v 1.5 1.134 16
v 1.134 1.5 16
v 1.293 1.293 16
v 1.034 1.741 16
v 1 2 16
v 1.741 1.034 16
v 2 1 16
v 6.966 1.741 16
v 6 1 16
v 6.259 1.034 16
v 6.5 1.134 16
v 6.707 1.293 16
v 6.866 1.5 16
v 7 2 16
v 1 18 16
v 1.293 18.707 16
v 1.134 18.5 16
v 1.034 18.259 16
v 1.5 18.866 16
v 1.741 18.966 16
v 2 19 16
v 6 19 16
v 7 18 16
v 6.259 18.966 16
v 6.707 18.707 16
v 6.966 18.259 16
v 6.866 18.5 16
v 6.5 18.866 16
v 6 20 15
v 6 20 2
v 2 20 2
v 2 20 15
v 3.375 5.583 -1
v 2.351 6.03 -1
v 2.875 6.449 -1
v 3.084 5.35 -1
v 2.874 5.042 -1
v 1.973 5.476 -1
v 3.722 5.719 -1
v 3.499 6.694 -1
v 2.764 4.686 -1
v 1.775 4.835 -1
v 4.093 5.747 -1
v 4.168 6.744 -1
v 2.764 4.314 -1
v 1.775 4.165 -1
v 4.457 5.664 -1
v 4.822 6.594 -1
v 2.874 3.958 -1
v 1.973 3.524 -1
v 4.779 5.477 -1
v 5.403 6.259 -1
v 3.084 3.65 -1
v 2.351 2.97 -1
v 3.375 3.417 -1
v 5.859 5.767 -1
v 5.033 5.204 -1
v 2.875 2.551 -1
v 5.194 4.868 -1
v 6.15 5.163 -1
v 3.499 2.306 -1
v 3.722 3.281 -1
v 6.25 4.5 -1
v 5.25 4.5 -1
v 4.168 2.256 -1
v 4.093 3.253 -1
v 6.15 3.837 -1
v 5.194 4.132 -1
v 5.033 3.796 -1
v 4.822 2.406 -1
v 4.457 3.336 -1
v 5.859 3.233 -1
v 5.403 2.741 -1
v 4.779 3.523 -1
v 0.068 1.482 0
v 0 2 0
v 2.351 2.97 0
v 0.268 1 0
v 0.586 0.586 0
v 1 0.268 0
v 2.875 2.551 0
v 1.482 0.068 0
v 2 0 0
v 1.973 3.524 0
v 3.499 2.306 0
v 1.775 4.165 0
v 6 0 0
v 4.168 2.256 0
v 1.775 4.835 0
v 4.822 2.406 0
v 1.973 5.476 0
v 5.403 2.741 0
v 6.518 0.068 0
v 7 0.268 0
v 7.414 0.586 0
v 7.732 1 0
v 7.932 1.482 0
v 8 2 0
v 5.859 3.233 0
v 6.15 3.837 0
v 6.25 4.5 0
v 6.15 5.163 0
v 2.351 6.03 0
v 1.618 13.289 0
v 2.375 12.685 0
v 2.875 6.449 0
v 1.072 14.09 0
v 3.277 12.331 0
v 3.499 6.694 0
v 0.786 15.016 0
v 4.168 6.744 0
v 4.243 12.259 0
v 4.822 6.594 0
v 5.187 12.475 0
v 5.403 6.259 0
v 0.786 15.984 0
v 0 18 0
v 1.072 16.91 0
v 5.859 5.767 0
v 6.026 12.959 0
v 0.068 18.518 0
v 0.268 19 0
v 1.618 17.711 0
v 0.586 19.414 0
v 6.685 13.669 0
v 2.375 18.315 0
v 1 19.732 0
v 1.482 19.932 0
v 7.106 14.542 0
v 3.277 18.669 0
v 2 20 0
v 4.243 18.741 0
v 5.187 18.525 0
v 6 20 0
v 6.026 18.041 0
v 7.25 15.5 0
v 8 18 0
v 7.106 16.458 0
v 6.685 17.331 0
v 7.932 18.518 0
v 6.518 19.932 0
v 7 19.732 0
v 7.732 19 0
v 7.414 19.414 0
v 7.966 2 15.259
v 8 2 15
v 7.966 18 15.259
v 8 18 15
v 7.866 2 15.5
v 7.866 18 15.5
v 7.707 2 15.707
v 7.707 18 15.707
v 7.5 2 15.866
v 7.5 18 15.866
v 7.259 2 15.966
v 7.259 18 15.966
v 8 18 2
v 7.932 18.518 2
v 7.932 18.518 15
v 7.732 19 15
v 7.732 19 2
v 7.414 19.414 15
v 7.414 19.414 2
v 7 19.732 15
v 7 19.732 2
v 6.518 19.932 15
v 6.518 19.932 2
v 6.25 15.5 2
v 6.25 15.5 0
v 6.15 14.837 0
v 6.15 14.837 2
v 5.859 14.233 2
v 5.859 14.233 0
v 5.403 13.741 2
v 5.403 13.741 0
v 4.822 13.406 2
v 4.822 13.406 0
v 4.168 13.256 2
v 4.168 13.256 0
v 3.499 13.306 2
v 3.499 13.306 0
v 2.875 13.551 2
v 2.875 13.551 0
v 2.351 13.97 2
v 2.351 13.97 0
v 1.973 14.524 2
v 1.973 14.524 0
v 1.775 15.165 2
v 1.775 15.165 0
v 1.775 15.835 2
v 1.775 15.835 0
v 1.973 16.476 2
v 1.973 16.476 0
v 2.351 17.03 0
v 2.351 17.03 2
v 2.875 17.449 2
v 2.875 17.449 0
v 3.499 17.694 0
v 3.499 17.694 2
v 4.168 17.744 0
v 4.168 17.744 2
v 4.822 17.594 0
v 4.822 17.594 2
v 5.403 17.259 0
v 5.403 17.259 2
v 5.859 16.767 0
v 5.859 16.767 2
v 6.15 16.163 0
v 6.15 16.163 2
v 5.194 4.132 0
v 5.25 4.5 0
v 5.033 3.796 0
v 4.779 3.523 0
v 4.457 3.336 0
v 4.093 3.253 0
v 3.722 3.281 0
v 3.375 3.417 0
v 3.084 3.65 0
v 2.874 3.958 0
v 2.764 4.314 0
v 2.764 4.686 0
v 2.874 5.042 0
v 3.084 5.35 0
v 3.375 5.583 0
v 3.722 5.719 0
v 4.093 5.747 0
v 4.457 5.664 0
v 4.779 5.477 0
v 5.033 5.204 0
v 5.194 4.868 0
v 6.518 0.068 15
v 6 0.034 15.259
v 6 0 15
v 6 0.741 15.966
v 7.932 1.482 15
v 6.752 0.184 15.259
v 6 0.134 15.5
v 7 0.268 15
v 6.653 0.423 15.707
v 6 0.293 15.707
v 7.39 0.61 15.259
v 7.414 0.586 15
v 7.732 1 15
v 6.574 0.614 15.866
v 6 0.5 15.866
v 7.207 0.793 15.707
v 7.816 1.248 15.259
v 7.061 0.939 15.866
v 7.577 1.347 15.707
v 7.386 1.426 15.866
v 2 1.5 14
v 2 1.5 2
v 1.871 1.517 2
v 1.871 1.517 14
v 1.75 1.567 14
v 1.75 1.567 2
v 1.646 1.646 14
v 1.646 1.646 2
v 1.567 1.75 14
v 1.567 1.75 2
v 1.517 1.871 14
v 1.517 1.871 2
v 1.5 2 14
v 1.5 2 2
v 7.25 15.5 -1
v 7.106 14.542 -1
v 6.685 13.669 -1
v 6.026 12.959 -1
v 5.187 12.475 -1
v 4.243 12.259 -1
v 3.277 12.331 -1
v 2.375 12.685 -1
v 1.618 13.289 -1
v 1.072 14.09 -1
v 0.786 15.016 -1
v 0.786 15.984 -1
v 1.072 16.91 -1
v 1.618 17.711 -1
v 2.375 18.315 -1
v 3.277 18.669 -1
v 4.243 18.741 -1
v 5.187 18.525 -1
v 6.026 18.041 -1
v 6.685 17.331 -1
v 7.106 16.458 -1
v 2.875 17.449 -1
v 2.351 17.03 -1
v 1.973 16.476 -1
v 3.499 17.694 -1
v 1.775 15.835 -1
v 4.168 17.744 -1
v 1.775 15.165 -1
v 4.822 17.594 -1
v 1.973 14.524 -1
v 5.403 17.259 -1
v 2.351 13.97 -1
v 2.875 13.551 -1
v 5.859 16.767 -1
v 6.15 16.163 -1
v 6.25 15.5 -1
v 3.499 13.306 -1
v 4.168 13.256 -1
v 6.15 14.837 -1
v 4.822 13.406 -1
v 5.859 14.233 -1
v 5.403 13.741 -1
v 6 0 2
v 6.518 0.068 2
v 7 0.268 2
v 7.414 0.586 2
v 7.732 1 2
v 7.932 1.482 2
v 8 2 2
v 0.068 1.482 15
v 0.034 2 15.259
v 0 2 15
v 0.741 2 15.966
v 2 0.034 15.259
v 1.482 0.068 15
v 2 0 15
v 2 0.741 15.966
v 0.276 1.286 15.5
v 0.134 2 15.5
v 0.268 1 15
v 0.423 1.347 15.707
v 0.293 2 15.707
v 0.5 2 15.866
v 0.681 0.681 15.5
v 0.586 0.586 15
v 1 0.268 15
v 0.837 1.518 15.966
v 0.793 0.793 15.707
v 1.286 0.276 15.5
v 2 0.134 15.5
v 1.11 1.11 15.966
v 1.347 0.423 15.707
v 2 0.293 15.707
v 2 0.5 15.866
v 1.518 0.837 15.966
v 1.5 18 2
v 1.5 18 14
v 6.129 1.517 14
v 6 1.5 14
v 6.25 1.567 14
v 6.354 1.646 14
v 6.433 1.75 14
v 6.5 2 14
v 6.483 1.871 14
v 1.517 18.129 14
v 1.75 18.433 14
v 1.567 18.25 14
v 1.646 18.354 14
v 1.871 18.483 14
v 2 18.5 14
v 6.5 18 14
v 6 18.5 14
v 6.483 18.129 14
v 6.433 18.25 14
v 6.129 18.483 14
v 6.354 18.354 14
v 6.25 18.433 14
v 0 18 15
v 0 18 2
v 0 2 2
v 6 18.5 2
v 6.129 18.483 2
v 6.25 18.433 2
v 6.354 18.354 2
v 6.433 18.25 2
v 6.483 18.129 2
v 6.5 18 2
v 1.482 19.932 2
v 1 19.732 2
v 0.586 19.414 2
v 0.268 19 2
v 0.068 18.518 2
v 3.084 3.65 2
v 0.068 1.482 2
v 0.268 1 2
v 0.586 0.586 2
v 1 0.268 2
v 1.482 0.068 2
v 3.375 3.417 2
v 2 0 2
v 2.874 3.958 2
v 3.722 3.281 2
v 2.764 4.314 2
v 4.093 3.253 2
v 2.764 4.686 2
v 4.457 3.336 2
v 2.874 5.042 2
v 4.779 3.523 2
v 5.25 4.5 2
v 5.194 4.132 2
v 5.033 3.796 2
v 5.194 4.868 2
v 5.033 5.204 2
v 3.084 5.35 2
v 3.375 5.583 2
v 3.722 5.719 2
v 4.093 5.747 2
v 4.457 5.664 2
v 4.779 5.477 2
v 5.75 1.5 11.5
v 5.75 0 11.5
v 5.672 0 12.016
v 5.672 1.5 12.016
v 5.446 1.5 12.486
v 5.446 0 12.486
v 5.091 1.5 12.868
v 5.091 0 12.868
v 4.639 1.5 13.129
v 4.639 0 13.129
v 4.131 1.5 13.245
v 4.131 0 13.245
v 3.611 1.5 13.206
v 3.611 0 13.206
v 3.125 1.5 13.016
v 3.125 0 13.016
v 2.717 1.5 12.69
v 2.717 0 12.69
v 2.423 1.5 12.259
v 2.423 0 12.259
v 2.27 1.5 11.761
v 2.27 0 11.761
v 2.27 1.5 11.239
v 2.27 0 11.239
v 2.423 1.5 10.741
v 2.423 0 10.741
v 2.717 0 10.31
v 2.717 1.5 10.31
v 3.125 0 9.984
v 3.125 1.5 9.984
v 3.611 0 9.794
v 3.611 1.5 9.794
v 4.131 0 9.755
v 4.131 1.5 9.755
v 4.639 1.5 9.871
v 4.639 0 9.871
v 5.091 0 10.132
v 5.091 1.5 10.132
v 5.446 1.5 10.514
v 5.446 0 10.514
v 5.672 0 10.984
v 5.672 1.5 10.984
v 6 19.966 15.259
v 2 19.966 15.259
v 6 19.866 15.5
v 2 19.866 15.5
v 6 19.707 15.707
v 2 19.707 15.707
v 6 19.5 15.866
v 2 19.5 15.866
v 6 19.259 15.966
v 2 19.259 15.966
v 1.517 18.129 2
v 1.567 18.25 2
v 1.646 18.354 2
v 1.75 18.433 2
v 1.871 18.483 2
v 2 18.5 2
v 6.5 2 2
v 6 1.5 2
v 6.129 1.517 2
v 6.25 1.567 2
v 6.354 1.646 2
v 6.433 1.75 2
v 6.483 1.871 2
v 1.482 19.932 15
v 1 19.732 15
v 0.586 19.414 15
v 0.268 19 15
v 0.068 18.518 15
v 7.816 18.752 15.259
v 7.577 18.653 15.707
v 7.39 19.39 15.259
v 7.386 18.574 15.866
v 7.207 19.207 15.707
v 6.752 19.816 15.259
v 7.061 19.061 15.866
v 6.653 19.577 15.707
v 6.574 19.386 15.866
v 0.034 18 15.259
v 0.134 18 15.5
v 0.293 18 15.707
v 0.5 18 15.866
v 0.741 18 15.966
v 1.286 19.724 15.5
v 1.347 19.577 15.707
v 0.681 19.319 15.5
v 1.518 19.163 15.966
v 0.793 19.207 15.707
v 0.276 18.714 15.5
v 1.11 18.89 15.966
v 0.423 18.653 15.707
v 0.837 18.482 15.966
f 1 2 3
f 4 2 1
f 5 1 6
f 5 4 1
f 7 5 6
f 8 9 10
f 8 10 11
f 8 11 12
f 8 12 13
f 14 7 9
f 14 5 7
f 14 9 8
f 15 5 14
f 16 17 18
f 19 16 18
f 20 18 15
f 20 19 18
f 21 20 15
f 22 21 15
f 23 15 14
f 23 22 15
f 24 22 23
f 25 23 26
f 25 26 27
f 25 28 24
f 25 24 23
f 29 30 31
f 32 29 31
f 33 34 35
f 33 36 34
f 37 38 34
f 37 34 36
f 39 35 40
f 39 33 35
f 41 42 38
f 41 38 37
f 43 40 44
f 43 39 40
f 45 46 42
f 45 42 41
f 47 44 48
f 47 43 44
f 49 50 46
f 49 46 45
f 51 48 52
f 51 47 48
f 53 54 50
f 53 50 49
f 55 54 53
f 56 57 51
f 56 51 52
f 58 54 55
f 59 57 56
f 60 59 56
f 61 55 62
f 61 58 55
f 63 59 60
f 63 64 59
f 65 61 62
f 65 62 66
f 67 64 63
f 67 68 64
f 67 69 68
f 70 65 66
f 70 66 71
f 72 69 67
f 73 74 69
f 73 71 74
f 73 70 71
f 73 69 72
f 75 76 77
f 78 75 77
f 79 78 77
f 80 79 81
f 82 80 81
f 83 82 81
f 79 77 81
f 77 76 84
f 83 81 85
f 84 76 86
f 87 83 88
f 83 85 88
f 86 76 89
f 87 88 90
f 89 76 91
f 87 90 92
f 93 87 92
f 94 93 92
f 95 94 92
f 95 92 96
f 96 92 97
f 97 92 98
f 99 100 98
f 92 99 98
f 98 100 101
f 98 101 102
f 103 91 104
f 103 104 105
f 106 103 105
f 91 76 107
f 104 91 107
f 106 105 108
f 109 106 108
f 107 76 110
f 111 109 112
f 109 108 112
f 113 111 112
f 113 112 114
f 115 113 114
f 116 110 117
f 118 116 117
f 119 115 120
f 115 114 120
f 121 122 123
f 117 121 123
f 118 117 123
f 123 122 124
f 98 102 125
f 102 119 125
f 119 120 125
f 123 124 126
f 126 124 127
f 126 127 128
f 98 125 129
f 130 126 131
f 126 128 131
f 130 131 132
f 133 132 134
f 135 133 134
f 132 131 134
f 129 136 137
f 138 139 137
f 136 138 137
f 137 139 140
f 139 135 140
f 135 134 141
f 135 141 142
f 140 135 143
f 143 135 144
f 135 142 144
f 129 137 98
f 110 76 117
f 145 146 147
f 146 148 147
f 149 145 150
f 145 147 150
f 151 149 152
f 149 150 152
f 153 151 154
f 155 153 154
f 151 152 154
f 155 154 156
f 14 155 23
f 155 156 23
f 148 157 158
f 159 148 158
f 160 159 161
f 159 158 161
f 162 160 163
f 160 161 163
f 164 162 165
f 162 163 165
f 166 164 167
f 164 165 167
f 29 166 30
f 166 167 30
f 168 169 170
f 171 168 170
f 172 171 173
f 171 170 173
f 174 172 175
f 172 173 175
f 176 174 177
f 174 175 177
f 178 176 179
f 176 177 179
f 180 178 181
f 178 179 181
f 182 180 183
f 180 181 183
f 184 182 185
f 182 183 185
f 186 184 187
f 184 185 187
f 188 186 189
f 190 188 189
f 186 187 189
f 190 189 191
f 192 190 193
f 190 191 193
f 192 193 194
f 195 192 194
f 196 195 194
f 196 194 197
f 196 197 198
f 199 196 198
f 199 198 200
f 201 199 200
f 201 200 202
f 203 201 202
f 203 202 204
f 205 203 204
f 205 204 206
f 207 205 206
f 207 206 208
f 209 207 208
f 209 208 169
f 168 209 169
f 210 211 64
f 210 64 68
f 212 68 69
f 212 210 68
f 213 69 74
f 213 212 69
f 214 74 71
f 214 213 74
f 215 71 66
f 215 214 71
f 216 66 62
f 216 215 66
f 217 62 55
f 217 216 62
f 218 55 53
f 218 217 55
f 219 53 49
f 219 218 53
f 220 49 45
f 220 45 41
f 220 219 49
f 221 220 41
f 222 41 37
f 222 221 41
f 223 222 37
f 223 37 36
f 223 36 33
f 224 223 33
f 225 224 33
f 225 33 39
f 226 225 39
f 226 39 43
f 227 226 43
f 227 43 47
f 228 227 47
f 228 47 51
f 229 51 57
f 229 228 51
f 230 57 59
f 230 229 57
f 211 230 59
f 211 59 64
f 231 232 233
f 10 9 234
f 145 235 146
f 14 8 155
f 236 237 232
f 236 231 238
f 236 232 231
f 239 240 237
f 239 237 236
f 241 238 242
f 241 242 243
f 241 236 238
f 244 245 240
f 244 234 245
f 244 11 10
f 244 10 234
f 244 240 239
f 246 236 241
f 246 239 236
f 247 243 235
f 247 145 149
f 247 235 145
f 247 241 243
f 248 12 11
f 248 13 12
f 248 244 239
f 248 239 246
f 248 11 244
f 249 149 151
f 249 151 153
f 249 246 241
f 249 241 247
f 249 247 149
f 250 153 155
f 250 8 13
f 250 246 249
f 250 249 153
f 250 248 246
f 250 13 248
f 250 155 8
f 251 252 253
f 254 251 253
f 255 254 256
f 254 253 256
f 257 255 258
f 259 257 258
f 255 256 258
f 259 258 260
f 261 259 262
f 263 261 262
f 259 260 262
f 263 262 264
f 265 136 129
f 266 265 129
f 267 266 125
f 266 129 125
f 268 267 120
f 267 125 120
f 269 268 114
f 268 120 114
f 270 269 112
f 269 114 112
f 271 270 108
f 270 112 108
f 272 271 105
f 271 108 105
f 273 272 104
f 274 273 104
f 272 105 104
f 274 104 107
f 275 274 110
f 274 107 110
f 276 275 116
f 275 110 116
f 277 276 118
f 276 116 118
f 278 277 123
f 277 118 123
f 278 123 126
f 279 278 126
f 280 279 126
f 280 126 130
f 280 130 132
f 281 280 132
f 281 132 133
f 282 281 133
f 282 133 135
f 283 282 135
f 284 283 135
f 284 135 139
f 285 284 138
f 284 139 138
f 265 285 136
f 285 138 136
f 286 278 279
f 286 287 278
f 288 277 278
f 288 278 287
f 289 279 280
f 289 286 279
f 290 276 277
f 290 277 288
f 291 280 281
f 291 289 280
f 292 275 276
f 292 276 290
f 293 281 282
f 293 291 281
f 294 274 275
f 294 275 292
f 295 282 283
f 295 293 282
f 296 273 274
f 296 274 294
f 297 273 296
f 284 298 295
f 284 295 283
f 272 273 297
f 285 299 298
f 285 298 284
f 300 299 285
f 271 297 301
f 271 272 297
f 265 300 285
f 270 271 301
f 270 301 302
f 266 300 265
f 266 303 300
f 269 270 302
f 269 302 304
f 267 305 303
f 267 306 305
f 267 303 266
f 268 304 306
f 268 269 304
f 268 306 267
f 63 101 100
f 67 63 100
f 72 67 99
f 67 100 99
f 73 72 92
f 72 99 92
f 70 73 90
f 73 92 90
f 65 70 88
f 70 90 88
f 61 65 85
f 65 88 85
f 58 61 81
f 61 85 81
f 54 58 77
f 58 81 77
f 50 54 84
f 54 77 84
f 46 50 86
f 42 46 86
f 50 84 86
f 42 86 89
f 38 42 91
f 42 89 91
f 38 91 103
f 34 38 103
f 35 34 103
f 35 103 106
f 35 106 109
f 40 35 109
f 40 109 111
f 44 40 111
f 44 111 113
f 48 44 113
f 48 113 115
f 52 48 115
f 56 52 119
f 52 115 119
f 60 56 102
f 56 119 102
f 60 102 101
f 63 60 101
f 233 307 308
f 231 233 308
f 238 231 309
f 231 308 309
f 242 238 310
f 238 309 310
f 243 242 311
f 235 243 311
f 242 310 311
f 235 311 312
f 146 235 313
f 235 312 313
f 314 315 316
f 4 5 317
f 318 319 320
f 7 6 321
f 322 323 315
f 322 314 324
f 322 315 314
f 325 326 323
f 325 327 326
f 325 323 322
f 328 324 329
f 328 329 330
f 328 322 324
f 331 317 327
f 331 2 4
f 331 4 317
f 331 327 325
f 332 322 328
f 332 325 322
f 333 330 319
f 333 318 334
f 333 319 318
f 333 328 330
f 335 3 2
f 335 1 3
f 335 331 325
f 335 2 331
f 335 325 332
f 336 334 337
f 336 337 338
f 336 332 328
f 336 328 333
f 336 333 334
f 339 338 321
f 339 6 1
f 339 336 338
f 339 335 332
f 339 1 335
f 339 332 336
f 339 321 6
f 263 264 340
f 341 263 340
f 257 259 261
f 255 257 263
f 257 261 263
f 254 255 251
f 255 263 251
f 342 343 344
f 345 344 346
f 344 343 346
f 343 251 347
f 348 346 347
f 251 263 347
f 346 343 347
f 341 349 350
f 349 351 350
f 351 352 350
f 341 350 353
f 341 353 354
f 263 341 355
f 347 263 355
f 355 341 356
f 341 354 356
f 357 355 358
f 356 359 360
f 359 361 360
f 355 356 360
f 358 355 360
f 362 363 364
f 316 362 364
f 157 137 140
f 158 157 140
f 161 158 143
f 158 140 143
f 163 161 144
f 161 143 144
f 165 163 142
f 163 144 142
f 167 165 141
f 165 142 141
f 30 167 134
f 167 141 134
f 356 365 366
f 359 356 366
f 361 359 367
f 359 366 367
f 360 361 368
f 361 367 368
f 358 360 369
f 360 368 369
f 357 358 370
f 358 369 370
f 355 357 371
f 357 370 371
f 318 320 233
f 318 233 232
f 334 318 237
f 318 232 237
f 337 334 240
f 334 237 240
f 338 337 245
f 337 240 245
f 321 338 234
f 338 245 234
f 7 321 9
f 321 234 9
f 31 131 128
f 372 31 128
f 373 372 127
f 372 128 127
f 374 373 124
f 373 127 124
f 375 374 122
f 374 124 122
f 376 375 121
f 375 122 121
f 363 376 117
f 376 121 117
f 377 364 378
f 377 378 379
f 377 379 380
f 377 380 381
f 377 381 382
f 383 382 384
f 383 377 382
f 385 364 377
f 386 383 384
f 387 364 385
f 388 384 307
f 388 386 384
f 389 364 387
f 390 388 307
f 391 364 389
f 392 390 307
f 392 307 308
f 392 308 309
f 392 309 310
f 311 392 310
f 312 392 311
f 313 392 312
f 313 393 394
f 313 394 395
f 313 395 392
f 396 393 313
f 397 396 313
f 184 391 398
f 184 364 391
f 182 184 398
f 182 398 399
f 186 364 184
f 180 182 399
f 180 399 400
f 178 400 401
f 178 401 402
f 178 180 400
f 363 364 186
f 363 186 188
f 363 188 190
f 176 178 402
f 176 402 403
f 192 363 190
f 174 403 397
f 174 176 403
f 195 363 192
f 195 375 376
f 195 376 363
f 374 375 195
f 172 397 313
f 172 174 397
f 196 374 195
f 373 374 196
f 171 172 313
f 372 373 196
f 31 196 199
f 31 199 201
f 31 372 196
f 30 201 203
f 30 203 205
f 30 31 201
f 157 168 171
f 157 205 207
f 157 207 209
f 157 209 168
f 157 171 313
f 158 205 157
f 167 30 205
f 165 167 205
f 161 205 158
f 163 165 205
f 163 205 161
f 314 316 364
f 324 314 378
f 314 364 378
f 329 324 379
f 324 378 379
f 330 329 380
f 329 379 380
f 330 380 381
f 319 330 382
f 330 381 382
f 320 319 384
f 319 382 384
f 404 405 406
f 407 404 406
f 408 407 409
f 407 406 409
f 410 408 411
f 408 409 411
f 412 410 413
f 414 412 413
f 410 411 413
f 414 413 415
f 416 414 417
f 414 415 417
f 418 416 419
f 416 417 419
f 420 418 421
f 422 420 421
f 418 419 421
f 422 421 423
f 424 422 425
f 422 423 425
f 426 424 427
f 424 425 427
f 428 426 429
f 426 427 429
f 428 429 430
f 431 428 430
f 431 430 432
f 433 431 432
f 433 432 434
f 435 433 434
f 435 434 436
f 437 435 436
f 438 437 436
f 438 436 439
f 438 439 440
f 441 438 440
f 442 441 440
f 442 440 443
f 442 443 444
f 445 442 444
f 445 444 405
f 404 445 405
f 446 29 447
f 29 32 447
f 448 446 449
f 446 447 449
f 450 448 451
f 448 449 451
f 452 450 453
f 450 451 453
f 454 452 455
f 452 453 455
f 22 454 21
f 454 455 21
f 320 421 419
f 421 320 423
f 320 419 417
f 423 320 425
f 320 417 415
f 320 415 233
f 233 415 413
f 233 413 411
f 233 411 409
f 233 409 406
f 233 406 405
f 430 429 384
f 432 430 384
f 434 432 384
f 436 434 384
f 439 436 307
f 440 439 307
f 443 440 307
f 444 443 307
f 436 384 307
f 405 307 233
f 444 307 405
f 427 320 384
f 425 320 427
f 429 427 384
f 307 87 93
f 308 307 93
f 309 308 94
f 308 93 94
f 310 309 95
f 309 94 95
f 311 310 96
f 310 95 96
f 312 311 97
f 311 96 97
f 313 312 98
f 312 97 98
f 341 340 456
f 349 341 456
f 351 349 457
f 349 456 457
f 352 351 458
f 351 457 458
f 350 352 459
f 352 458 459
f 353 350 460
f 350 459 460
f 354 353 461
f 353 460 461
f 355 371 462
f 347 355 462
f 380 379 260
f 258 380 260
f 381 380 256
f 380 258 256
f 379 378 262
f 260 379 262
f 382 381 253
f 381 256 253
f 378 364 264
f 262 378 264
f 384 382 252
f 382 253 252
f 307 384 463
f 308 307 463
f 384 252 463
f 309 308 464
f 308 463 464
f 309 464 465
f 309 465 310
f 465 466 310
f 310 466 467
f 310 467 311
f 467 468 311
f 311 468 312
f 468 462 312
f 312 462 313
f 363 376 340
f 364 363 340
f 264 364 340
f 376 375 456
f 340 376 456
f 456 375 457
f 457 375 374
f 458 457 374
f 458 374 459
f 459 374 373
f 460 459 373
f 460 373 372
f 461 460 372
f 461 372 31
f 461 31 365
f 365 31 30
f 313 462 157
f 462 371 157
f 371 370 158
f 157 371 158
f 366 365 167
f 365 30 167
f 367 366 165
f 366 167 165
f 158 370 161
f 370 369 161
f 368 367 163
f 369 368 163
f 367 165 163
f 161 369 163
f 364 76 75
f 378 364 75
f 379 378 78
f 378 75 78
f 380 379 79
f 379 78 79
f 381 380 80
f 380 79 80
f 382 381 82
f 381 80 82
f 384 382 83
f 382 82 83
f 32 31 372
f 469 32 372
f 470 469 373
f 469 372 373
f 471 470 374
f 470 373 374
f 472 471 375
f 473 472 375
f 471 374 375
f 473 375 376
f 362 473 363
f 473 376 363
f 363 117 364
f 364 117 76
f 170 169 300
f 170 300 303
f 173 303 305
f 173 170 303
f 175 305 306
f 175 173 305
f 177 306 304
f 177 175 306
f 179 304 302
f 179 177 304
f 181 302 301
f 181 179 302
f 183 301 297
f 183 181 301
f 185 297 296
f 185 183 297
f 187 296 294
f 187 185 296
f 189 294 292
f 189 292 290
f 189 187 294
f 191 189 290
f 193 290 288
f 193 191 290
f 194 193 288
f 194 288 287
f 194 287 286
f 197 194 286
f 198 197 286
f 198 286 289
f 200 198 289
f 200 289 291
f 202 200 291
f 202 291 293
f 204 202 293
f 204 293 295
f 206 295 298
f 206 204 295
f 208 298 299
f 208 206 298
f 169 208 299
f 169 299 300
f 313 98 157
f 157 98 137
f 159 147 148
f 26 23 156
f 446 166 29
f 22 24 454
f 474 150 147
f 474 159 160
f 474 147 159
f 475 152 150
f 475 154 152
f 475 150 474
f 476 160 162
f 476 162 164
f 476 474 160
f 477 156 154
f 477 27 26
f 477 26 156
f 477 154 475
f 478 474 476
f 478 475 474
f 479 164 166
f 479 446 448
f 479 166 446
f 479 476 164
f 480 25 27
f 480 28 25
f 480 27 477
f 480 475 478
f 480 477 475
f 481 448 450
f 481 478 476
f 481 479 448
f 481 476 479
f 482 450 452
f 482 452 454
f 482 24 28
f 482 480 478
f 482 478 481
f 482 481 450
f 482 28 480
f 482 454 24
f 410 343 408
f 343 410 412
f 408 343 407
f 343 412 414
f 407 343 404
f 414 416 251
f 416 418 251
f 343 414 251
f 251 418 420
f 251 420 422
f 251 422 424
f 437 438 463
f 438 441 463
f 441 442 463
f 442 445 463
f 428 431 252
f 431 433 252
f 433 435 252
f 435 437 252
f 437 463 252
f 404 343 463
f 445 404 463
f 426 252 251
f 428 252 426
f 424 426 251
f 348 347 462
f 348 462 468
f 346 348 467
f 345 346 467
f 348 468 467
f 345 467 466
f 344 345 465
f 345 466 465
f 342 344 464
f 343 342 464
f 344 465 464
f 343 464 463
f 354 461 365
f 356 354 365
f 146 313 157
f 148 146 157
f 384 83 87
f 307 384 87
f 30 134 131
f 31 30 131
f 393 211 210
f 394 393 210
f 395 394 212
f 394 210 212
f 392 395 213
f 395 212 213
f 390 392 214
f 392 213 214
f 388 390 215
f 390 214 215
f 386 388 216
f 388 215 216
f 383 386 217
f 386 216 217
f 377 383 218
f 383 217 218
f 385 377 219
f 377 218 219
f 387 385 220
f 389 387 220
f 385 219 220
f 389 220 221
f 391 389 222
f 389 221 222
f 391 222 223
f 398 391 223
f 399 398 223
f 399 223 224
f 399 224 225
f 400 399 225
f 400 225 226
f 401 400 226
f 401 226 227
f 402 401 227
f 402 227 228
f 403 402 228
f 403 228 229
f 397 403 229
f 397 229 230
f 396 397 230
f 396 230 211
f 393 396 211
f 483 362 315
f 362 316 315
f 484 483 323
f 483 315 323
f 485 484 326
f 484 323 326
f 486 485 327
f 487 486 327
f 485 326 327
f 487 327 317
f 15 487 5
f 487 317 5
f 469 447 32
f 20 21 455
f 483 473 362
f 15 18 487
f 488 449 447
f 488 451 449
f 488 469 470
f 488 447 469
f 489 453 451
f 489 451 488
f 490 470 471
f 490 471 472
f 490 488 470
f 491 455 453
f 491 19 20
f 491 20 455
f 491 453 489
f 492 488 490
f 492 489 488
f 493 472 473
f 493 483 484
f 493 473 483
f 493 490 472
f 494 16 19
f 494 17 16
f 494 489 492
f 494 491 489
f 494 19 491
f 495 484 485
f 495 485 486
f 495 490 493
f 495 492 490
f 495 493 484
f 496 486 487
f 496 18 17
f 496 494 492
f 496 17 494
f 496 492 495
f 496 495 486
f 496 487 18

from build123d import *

# Parameters (mm, degrees)
F1_DEPTH  = 2
F2_R      = 2.25
F2_R_2    = 1.25
F3_DEPTH  = 2.001
F4_R      = 2.25
F4_R_2    = 1.25
F4_R_3    = 3.25
F5_DEPTH  = 1
F7_DEPTH  = 12
F8_R      = 1.75
F9_DEPTH  = 4
F11_DEPTH = 2
F12_R     = 1


with BuildPart() as f1:
    # F0 (on Top) → F1 (new body)
    with BuildSketch(Plane.XY):
        with BuildLine():
            ThreePointArc((0, 2), (0.585786, 0.585786), (2, 0))
            Line((2, 0), (6, 0))
            ThreePointArc((6, 0), (7.414214, 0.585786), (8, 2))
            Line((8, 2), (8, 18))
            ThreePointArc((8, 18), (7.414214, 19.414214), (6, 20))
            Line((6, 20), (2, 20))
            ThreePointArc((2, 20), (0.585786, 19.414214), (0, 18))
            Line((0, 18), (0, 2))
        make_face()
    extrude(amount=F1_DEPTH)

    # F2 (on face) → F3 (cut, through all)
    with BuildSketch(Plane(origin=(0, 0, 0), x_dir=(1, 0, 0), z_dir=(0, 0, -1))):
        with Locations((4, -15.5)):
            Circle(F2_R)
        with Locations((4, -4.5)):
            Circle(F2_R_2)
    extrude(amount=-F3_DEPTH, mode=Mode.SUBTRACT)

    # F4 (on face) → F5 (join)
    with BuildSketch(Plane(origin=(0, 0, 0), x_dir=(1, 0, 0), z_dir=(0, 0, -1))):
        with Locations((4, -4.5)):
            Circle(F4_R)
        with Locations((4, -4.5)):
            Circle(F4_R_2, mode=Mode.SUBTRACT)
        with Locations((4, -15.5)):
            Circle(F4_R_3)
        with Locations((4, -15.5)):
            Circle(F4_R, mode=Mode.SUBTRACT)
    extrude(amount=F5_DEPTH)


with BuildPart() as f7:
    # F6 (on face) → F7 (new body)
    with BuildSketch(Plane.XY.offset(2)):
        with BuildLine():
            ThreePointArc((0, 2), (0.585786, 0.585786), (2, 0))
            Line((2, 0), (6, 0))
            ThreePointArc((6, 0), (7.414214, 0.585786), (8, 2))
            Line((8, 2), (8, 18))
            ThreePointArc((8, 18), (7.414214, 19.414214), (6, 20))
            Line((6, 20), (2, 20))
            ThreePointArc((2, 20), (0.585786, 19.414214), (0, 18))
            Line((0, 18), (0, 2))
        make_face()
        with BuildLine():
            ThreePointArc((2, 1.5), (1.646447, 1.646447), (1.5, 2))
            Line((1.5, 2), (1.5, 18))
            ThreePointArc((1.5, 18), (1.646447, 18.353553), (2, 18.5))
            Line((2, 18.5), (6, 18.5))
            ThreePointArc((6, 18.5), (6.353553, 18.353553), (6.5, 18))
            Line((6.5, 18), (6.5, 2))
            ThreePointArc((6.5, 2), (6.353553, 1.646447), (6, 1.5))
            Line((6, 1.5), (2, 1.5))
        make_face(mode=Mode.SUBTRACT)
    extrude(amount=F7_DEPTH)

    # F8 (on face) → F9 (cut)
    with BuildSketch(Plane.XZ):
        with Locations((4, 11.5)):
            Circle(F8_R)
    extrude(amount=-F9_DEPTH, mode=Mode.SUBTRACT)

    # F10 (on face) → F11 (join)
    with BuildSketch(Plane.XY.offset(14)):
        with BuildLine():
            Line((6, 20), (2, 20))
            ThreePointArc((2, 20), (0.585786, 19.414214), (0, 18))
            Line((0, 18), (0, 2))
            ThreePointArc((0, 2), (0.585786, 0.585786), (2, 0))
            Line((2, 0), (6, 0))
            ThreePointArc((6, 0), (7.414214, 0.585786), (8, 2))
            Line((8, 2), (8, 18))
            ThreePointArc((8, 18), (7.414214, 19.414214), (6, 20))
        make_face()
    extrude(amount=F11_DEPTH)

    # F12
    f12_edges = [f7.edges().sort_by_distance(p)[0] for p in [
        (8, 10, 16),
    ]]
    fillet(f12_edges, radius=F12_R)


solid = Compound([f1.part, f7.part])
